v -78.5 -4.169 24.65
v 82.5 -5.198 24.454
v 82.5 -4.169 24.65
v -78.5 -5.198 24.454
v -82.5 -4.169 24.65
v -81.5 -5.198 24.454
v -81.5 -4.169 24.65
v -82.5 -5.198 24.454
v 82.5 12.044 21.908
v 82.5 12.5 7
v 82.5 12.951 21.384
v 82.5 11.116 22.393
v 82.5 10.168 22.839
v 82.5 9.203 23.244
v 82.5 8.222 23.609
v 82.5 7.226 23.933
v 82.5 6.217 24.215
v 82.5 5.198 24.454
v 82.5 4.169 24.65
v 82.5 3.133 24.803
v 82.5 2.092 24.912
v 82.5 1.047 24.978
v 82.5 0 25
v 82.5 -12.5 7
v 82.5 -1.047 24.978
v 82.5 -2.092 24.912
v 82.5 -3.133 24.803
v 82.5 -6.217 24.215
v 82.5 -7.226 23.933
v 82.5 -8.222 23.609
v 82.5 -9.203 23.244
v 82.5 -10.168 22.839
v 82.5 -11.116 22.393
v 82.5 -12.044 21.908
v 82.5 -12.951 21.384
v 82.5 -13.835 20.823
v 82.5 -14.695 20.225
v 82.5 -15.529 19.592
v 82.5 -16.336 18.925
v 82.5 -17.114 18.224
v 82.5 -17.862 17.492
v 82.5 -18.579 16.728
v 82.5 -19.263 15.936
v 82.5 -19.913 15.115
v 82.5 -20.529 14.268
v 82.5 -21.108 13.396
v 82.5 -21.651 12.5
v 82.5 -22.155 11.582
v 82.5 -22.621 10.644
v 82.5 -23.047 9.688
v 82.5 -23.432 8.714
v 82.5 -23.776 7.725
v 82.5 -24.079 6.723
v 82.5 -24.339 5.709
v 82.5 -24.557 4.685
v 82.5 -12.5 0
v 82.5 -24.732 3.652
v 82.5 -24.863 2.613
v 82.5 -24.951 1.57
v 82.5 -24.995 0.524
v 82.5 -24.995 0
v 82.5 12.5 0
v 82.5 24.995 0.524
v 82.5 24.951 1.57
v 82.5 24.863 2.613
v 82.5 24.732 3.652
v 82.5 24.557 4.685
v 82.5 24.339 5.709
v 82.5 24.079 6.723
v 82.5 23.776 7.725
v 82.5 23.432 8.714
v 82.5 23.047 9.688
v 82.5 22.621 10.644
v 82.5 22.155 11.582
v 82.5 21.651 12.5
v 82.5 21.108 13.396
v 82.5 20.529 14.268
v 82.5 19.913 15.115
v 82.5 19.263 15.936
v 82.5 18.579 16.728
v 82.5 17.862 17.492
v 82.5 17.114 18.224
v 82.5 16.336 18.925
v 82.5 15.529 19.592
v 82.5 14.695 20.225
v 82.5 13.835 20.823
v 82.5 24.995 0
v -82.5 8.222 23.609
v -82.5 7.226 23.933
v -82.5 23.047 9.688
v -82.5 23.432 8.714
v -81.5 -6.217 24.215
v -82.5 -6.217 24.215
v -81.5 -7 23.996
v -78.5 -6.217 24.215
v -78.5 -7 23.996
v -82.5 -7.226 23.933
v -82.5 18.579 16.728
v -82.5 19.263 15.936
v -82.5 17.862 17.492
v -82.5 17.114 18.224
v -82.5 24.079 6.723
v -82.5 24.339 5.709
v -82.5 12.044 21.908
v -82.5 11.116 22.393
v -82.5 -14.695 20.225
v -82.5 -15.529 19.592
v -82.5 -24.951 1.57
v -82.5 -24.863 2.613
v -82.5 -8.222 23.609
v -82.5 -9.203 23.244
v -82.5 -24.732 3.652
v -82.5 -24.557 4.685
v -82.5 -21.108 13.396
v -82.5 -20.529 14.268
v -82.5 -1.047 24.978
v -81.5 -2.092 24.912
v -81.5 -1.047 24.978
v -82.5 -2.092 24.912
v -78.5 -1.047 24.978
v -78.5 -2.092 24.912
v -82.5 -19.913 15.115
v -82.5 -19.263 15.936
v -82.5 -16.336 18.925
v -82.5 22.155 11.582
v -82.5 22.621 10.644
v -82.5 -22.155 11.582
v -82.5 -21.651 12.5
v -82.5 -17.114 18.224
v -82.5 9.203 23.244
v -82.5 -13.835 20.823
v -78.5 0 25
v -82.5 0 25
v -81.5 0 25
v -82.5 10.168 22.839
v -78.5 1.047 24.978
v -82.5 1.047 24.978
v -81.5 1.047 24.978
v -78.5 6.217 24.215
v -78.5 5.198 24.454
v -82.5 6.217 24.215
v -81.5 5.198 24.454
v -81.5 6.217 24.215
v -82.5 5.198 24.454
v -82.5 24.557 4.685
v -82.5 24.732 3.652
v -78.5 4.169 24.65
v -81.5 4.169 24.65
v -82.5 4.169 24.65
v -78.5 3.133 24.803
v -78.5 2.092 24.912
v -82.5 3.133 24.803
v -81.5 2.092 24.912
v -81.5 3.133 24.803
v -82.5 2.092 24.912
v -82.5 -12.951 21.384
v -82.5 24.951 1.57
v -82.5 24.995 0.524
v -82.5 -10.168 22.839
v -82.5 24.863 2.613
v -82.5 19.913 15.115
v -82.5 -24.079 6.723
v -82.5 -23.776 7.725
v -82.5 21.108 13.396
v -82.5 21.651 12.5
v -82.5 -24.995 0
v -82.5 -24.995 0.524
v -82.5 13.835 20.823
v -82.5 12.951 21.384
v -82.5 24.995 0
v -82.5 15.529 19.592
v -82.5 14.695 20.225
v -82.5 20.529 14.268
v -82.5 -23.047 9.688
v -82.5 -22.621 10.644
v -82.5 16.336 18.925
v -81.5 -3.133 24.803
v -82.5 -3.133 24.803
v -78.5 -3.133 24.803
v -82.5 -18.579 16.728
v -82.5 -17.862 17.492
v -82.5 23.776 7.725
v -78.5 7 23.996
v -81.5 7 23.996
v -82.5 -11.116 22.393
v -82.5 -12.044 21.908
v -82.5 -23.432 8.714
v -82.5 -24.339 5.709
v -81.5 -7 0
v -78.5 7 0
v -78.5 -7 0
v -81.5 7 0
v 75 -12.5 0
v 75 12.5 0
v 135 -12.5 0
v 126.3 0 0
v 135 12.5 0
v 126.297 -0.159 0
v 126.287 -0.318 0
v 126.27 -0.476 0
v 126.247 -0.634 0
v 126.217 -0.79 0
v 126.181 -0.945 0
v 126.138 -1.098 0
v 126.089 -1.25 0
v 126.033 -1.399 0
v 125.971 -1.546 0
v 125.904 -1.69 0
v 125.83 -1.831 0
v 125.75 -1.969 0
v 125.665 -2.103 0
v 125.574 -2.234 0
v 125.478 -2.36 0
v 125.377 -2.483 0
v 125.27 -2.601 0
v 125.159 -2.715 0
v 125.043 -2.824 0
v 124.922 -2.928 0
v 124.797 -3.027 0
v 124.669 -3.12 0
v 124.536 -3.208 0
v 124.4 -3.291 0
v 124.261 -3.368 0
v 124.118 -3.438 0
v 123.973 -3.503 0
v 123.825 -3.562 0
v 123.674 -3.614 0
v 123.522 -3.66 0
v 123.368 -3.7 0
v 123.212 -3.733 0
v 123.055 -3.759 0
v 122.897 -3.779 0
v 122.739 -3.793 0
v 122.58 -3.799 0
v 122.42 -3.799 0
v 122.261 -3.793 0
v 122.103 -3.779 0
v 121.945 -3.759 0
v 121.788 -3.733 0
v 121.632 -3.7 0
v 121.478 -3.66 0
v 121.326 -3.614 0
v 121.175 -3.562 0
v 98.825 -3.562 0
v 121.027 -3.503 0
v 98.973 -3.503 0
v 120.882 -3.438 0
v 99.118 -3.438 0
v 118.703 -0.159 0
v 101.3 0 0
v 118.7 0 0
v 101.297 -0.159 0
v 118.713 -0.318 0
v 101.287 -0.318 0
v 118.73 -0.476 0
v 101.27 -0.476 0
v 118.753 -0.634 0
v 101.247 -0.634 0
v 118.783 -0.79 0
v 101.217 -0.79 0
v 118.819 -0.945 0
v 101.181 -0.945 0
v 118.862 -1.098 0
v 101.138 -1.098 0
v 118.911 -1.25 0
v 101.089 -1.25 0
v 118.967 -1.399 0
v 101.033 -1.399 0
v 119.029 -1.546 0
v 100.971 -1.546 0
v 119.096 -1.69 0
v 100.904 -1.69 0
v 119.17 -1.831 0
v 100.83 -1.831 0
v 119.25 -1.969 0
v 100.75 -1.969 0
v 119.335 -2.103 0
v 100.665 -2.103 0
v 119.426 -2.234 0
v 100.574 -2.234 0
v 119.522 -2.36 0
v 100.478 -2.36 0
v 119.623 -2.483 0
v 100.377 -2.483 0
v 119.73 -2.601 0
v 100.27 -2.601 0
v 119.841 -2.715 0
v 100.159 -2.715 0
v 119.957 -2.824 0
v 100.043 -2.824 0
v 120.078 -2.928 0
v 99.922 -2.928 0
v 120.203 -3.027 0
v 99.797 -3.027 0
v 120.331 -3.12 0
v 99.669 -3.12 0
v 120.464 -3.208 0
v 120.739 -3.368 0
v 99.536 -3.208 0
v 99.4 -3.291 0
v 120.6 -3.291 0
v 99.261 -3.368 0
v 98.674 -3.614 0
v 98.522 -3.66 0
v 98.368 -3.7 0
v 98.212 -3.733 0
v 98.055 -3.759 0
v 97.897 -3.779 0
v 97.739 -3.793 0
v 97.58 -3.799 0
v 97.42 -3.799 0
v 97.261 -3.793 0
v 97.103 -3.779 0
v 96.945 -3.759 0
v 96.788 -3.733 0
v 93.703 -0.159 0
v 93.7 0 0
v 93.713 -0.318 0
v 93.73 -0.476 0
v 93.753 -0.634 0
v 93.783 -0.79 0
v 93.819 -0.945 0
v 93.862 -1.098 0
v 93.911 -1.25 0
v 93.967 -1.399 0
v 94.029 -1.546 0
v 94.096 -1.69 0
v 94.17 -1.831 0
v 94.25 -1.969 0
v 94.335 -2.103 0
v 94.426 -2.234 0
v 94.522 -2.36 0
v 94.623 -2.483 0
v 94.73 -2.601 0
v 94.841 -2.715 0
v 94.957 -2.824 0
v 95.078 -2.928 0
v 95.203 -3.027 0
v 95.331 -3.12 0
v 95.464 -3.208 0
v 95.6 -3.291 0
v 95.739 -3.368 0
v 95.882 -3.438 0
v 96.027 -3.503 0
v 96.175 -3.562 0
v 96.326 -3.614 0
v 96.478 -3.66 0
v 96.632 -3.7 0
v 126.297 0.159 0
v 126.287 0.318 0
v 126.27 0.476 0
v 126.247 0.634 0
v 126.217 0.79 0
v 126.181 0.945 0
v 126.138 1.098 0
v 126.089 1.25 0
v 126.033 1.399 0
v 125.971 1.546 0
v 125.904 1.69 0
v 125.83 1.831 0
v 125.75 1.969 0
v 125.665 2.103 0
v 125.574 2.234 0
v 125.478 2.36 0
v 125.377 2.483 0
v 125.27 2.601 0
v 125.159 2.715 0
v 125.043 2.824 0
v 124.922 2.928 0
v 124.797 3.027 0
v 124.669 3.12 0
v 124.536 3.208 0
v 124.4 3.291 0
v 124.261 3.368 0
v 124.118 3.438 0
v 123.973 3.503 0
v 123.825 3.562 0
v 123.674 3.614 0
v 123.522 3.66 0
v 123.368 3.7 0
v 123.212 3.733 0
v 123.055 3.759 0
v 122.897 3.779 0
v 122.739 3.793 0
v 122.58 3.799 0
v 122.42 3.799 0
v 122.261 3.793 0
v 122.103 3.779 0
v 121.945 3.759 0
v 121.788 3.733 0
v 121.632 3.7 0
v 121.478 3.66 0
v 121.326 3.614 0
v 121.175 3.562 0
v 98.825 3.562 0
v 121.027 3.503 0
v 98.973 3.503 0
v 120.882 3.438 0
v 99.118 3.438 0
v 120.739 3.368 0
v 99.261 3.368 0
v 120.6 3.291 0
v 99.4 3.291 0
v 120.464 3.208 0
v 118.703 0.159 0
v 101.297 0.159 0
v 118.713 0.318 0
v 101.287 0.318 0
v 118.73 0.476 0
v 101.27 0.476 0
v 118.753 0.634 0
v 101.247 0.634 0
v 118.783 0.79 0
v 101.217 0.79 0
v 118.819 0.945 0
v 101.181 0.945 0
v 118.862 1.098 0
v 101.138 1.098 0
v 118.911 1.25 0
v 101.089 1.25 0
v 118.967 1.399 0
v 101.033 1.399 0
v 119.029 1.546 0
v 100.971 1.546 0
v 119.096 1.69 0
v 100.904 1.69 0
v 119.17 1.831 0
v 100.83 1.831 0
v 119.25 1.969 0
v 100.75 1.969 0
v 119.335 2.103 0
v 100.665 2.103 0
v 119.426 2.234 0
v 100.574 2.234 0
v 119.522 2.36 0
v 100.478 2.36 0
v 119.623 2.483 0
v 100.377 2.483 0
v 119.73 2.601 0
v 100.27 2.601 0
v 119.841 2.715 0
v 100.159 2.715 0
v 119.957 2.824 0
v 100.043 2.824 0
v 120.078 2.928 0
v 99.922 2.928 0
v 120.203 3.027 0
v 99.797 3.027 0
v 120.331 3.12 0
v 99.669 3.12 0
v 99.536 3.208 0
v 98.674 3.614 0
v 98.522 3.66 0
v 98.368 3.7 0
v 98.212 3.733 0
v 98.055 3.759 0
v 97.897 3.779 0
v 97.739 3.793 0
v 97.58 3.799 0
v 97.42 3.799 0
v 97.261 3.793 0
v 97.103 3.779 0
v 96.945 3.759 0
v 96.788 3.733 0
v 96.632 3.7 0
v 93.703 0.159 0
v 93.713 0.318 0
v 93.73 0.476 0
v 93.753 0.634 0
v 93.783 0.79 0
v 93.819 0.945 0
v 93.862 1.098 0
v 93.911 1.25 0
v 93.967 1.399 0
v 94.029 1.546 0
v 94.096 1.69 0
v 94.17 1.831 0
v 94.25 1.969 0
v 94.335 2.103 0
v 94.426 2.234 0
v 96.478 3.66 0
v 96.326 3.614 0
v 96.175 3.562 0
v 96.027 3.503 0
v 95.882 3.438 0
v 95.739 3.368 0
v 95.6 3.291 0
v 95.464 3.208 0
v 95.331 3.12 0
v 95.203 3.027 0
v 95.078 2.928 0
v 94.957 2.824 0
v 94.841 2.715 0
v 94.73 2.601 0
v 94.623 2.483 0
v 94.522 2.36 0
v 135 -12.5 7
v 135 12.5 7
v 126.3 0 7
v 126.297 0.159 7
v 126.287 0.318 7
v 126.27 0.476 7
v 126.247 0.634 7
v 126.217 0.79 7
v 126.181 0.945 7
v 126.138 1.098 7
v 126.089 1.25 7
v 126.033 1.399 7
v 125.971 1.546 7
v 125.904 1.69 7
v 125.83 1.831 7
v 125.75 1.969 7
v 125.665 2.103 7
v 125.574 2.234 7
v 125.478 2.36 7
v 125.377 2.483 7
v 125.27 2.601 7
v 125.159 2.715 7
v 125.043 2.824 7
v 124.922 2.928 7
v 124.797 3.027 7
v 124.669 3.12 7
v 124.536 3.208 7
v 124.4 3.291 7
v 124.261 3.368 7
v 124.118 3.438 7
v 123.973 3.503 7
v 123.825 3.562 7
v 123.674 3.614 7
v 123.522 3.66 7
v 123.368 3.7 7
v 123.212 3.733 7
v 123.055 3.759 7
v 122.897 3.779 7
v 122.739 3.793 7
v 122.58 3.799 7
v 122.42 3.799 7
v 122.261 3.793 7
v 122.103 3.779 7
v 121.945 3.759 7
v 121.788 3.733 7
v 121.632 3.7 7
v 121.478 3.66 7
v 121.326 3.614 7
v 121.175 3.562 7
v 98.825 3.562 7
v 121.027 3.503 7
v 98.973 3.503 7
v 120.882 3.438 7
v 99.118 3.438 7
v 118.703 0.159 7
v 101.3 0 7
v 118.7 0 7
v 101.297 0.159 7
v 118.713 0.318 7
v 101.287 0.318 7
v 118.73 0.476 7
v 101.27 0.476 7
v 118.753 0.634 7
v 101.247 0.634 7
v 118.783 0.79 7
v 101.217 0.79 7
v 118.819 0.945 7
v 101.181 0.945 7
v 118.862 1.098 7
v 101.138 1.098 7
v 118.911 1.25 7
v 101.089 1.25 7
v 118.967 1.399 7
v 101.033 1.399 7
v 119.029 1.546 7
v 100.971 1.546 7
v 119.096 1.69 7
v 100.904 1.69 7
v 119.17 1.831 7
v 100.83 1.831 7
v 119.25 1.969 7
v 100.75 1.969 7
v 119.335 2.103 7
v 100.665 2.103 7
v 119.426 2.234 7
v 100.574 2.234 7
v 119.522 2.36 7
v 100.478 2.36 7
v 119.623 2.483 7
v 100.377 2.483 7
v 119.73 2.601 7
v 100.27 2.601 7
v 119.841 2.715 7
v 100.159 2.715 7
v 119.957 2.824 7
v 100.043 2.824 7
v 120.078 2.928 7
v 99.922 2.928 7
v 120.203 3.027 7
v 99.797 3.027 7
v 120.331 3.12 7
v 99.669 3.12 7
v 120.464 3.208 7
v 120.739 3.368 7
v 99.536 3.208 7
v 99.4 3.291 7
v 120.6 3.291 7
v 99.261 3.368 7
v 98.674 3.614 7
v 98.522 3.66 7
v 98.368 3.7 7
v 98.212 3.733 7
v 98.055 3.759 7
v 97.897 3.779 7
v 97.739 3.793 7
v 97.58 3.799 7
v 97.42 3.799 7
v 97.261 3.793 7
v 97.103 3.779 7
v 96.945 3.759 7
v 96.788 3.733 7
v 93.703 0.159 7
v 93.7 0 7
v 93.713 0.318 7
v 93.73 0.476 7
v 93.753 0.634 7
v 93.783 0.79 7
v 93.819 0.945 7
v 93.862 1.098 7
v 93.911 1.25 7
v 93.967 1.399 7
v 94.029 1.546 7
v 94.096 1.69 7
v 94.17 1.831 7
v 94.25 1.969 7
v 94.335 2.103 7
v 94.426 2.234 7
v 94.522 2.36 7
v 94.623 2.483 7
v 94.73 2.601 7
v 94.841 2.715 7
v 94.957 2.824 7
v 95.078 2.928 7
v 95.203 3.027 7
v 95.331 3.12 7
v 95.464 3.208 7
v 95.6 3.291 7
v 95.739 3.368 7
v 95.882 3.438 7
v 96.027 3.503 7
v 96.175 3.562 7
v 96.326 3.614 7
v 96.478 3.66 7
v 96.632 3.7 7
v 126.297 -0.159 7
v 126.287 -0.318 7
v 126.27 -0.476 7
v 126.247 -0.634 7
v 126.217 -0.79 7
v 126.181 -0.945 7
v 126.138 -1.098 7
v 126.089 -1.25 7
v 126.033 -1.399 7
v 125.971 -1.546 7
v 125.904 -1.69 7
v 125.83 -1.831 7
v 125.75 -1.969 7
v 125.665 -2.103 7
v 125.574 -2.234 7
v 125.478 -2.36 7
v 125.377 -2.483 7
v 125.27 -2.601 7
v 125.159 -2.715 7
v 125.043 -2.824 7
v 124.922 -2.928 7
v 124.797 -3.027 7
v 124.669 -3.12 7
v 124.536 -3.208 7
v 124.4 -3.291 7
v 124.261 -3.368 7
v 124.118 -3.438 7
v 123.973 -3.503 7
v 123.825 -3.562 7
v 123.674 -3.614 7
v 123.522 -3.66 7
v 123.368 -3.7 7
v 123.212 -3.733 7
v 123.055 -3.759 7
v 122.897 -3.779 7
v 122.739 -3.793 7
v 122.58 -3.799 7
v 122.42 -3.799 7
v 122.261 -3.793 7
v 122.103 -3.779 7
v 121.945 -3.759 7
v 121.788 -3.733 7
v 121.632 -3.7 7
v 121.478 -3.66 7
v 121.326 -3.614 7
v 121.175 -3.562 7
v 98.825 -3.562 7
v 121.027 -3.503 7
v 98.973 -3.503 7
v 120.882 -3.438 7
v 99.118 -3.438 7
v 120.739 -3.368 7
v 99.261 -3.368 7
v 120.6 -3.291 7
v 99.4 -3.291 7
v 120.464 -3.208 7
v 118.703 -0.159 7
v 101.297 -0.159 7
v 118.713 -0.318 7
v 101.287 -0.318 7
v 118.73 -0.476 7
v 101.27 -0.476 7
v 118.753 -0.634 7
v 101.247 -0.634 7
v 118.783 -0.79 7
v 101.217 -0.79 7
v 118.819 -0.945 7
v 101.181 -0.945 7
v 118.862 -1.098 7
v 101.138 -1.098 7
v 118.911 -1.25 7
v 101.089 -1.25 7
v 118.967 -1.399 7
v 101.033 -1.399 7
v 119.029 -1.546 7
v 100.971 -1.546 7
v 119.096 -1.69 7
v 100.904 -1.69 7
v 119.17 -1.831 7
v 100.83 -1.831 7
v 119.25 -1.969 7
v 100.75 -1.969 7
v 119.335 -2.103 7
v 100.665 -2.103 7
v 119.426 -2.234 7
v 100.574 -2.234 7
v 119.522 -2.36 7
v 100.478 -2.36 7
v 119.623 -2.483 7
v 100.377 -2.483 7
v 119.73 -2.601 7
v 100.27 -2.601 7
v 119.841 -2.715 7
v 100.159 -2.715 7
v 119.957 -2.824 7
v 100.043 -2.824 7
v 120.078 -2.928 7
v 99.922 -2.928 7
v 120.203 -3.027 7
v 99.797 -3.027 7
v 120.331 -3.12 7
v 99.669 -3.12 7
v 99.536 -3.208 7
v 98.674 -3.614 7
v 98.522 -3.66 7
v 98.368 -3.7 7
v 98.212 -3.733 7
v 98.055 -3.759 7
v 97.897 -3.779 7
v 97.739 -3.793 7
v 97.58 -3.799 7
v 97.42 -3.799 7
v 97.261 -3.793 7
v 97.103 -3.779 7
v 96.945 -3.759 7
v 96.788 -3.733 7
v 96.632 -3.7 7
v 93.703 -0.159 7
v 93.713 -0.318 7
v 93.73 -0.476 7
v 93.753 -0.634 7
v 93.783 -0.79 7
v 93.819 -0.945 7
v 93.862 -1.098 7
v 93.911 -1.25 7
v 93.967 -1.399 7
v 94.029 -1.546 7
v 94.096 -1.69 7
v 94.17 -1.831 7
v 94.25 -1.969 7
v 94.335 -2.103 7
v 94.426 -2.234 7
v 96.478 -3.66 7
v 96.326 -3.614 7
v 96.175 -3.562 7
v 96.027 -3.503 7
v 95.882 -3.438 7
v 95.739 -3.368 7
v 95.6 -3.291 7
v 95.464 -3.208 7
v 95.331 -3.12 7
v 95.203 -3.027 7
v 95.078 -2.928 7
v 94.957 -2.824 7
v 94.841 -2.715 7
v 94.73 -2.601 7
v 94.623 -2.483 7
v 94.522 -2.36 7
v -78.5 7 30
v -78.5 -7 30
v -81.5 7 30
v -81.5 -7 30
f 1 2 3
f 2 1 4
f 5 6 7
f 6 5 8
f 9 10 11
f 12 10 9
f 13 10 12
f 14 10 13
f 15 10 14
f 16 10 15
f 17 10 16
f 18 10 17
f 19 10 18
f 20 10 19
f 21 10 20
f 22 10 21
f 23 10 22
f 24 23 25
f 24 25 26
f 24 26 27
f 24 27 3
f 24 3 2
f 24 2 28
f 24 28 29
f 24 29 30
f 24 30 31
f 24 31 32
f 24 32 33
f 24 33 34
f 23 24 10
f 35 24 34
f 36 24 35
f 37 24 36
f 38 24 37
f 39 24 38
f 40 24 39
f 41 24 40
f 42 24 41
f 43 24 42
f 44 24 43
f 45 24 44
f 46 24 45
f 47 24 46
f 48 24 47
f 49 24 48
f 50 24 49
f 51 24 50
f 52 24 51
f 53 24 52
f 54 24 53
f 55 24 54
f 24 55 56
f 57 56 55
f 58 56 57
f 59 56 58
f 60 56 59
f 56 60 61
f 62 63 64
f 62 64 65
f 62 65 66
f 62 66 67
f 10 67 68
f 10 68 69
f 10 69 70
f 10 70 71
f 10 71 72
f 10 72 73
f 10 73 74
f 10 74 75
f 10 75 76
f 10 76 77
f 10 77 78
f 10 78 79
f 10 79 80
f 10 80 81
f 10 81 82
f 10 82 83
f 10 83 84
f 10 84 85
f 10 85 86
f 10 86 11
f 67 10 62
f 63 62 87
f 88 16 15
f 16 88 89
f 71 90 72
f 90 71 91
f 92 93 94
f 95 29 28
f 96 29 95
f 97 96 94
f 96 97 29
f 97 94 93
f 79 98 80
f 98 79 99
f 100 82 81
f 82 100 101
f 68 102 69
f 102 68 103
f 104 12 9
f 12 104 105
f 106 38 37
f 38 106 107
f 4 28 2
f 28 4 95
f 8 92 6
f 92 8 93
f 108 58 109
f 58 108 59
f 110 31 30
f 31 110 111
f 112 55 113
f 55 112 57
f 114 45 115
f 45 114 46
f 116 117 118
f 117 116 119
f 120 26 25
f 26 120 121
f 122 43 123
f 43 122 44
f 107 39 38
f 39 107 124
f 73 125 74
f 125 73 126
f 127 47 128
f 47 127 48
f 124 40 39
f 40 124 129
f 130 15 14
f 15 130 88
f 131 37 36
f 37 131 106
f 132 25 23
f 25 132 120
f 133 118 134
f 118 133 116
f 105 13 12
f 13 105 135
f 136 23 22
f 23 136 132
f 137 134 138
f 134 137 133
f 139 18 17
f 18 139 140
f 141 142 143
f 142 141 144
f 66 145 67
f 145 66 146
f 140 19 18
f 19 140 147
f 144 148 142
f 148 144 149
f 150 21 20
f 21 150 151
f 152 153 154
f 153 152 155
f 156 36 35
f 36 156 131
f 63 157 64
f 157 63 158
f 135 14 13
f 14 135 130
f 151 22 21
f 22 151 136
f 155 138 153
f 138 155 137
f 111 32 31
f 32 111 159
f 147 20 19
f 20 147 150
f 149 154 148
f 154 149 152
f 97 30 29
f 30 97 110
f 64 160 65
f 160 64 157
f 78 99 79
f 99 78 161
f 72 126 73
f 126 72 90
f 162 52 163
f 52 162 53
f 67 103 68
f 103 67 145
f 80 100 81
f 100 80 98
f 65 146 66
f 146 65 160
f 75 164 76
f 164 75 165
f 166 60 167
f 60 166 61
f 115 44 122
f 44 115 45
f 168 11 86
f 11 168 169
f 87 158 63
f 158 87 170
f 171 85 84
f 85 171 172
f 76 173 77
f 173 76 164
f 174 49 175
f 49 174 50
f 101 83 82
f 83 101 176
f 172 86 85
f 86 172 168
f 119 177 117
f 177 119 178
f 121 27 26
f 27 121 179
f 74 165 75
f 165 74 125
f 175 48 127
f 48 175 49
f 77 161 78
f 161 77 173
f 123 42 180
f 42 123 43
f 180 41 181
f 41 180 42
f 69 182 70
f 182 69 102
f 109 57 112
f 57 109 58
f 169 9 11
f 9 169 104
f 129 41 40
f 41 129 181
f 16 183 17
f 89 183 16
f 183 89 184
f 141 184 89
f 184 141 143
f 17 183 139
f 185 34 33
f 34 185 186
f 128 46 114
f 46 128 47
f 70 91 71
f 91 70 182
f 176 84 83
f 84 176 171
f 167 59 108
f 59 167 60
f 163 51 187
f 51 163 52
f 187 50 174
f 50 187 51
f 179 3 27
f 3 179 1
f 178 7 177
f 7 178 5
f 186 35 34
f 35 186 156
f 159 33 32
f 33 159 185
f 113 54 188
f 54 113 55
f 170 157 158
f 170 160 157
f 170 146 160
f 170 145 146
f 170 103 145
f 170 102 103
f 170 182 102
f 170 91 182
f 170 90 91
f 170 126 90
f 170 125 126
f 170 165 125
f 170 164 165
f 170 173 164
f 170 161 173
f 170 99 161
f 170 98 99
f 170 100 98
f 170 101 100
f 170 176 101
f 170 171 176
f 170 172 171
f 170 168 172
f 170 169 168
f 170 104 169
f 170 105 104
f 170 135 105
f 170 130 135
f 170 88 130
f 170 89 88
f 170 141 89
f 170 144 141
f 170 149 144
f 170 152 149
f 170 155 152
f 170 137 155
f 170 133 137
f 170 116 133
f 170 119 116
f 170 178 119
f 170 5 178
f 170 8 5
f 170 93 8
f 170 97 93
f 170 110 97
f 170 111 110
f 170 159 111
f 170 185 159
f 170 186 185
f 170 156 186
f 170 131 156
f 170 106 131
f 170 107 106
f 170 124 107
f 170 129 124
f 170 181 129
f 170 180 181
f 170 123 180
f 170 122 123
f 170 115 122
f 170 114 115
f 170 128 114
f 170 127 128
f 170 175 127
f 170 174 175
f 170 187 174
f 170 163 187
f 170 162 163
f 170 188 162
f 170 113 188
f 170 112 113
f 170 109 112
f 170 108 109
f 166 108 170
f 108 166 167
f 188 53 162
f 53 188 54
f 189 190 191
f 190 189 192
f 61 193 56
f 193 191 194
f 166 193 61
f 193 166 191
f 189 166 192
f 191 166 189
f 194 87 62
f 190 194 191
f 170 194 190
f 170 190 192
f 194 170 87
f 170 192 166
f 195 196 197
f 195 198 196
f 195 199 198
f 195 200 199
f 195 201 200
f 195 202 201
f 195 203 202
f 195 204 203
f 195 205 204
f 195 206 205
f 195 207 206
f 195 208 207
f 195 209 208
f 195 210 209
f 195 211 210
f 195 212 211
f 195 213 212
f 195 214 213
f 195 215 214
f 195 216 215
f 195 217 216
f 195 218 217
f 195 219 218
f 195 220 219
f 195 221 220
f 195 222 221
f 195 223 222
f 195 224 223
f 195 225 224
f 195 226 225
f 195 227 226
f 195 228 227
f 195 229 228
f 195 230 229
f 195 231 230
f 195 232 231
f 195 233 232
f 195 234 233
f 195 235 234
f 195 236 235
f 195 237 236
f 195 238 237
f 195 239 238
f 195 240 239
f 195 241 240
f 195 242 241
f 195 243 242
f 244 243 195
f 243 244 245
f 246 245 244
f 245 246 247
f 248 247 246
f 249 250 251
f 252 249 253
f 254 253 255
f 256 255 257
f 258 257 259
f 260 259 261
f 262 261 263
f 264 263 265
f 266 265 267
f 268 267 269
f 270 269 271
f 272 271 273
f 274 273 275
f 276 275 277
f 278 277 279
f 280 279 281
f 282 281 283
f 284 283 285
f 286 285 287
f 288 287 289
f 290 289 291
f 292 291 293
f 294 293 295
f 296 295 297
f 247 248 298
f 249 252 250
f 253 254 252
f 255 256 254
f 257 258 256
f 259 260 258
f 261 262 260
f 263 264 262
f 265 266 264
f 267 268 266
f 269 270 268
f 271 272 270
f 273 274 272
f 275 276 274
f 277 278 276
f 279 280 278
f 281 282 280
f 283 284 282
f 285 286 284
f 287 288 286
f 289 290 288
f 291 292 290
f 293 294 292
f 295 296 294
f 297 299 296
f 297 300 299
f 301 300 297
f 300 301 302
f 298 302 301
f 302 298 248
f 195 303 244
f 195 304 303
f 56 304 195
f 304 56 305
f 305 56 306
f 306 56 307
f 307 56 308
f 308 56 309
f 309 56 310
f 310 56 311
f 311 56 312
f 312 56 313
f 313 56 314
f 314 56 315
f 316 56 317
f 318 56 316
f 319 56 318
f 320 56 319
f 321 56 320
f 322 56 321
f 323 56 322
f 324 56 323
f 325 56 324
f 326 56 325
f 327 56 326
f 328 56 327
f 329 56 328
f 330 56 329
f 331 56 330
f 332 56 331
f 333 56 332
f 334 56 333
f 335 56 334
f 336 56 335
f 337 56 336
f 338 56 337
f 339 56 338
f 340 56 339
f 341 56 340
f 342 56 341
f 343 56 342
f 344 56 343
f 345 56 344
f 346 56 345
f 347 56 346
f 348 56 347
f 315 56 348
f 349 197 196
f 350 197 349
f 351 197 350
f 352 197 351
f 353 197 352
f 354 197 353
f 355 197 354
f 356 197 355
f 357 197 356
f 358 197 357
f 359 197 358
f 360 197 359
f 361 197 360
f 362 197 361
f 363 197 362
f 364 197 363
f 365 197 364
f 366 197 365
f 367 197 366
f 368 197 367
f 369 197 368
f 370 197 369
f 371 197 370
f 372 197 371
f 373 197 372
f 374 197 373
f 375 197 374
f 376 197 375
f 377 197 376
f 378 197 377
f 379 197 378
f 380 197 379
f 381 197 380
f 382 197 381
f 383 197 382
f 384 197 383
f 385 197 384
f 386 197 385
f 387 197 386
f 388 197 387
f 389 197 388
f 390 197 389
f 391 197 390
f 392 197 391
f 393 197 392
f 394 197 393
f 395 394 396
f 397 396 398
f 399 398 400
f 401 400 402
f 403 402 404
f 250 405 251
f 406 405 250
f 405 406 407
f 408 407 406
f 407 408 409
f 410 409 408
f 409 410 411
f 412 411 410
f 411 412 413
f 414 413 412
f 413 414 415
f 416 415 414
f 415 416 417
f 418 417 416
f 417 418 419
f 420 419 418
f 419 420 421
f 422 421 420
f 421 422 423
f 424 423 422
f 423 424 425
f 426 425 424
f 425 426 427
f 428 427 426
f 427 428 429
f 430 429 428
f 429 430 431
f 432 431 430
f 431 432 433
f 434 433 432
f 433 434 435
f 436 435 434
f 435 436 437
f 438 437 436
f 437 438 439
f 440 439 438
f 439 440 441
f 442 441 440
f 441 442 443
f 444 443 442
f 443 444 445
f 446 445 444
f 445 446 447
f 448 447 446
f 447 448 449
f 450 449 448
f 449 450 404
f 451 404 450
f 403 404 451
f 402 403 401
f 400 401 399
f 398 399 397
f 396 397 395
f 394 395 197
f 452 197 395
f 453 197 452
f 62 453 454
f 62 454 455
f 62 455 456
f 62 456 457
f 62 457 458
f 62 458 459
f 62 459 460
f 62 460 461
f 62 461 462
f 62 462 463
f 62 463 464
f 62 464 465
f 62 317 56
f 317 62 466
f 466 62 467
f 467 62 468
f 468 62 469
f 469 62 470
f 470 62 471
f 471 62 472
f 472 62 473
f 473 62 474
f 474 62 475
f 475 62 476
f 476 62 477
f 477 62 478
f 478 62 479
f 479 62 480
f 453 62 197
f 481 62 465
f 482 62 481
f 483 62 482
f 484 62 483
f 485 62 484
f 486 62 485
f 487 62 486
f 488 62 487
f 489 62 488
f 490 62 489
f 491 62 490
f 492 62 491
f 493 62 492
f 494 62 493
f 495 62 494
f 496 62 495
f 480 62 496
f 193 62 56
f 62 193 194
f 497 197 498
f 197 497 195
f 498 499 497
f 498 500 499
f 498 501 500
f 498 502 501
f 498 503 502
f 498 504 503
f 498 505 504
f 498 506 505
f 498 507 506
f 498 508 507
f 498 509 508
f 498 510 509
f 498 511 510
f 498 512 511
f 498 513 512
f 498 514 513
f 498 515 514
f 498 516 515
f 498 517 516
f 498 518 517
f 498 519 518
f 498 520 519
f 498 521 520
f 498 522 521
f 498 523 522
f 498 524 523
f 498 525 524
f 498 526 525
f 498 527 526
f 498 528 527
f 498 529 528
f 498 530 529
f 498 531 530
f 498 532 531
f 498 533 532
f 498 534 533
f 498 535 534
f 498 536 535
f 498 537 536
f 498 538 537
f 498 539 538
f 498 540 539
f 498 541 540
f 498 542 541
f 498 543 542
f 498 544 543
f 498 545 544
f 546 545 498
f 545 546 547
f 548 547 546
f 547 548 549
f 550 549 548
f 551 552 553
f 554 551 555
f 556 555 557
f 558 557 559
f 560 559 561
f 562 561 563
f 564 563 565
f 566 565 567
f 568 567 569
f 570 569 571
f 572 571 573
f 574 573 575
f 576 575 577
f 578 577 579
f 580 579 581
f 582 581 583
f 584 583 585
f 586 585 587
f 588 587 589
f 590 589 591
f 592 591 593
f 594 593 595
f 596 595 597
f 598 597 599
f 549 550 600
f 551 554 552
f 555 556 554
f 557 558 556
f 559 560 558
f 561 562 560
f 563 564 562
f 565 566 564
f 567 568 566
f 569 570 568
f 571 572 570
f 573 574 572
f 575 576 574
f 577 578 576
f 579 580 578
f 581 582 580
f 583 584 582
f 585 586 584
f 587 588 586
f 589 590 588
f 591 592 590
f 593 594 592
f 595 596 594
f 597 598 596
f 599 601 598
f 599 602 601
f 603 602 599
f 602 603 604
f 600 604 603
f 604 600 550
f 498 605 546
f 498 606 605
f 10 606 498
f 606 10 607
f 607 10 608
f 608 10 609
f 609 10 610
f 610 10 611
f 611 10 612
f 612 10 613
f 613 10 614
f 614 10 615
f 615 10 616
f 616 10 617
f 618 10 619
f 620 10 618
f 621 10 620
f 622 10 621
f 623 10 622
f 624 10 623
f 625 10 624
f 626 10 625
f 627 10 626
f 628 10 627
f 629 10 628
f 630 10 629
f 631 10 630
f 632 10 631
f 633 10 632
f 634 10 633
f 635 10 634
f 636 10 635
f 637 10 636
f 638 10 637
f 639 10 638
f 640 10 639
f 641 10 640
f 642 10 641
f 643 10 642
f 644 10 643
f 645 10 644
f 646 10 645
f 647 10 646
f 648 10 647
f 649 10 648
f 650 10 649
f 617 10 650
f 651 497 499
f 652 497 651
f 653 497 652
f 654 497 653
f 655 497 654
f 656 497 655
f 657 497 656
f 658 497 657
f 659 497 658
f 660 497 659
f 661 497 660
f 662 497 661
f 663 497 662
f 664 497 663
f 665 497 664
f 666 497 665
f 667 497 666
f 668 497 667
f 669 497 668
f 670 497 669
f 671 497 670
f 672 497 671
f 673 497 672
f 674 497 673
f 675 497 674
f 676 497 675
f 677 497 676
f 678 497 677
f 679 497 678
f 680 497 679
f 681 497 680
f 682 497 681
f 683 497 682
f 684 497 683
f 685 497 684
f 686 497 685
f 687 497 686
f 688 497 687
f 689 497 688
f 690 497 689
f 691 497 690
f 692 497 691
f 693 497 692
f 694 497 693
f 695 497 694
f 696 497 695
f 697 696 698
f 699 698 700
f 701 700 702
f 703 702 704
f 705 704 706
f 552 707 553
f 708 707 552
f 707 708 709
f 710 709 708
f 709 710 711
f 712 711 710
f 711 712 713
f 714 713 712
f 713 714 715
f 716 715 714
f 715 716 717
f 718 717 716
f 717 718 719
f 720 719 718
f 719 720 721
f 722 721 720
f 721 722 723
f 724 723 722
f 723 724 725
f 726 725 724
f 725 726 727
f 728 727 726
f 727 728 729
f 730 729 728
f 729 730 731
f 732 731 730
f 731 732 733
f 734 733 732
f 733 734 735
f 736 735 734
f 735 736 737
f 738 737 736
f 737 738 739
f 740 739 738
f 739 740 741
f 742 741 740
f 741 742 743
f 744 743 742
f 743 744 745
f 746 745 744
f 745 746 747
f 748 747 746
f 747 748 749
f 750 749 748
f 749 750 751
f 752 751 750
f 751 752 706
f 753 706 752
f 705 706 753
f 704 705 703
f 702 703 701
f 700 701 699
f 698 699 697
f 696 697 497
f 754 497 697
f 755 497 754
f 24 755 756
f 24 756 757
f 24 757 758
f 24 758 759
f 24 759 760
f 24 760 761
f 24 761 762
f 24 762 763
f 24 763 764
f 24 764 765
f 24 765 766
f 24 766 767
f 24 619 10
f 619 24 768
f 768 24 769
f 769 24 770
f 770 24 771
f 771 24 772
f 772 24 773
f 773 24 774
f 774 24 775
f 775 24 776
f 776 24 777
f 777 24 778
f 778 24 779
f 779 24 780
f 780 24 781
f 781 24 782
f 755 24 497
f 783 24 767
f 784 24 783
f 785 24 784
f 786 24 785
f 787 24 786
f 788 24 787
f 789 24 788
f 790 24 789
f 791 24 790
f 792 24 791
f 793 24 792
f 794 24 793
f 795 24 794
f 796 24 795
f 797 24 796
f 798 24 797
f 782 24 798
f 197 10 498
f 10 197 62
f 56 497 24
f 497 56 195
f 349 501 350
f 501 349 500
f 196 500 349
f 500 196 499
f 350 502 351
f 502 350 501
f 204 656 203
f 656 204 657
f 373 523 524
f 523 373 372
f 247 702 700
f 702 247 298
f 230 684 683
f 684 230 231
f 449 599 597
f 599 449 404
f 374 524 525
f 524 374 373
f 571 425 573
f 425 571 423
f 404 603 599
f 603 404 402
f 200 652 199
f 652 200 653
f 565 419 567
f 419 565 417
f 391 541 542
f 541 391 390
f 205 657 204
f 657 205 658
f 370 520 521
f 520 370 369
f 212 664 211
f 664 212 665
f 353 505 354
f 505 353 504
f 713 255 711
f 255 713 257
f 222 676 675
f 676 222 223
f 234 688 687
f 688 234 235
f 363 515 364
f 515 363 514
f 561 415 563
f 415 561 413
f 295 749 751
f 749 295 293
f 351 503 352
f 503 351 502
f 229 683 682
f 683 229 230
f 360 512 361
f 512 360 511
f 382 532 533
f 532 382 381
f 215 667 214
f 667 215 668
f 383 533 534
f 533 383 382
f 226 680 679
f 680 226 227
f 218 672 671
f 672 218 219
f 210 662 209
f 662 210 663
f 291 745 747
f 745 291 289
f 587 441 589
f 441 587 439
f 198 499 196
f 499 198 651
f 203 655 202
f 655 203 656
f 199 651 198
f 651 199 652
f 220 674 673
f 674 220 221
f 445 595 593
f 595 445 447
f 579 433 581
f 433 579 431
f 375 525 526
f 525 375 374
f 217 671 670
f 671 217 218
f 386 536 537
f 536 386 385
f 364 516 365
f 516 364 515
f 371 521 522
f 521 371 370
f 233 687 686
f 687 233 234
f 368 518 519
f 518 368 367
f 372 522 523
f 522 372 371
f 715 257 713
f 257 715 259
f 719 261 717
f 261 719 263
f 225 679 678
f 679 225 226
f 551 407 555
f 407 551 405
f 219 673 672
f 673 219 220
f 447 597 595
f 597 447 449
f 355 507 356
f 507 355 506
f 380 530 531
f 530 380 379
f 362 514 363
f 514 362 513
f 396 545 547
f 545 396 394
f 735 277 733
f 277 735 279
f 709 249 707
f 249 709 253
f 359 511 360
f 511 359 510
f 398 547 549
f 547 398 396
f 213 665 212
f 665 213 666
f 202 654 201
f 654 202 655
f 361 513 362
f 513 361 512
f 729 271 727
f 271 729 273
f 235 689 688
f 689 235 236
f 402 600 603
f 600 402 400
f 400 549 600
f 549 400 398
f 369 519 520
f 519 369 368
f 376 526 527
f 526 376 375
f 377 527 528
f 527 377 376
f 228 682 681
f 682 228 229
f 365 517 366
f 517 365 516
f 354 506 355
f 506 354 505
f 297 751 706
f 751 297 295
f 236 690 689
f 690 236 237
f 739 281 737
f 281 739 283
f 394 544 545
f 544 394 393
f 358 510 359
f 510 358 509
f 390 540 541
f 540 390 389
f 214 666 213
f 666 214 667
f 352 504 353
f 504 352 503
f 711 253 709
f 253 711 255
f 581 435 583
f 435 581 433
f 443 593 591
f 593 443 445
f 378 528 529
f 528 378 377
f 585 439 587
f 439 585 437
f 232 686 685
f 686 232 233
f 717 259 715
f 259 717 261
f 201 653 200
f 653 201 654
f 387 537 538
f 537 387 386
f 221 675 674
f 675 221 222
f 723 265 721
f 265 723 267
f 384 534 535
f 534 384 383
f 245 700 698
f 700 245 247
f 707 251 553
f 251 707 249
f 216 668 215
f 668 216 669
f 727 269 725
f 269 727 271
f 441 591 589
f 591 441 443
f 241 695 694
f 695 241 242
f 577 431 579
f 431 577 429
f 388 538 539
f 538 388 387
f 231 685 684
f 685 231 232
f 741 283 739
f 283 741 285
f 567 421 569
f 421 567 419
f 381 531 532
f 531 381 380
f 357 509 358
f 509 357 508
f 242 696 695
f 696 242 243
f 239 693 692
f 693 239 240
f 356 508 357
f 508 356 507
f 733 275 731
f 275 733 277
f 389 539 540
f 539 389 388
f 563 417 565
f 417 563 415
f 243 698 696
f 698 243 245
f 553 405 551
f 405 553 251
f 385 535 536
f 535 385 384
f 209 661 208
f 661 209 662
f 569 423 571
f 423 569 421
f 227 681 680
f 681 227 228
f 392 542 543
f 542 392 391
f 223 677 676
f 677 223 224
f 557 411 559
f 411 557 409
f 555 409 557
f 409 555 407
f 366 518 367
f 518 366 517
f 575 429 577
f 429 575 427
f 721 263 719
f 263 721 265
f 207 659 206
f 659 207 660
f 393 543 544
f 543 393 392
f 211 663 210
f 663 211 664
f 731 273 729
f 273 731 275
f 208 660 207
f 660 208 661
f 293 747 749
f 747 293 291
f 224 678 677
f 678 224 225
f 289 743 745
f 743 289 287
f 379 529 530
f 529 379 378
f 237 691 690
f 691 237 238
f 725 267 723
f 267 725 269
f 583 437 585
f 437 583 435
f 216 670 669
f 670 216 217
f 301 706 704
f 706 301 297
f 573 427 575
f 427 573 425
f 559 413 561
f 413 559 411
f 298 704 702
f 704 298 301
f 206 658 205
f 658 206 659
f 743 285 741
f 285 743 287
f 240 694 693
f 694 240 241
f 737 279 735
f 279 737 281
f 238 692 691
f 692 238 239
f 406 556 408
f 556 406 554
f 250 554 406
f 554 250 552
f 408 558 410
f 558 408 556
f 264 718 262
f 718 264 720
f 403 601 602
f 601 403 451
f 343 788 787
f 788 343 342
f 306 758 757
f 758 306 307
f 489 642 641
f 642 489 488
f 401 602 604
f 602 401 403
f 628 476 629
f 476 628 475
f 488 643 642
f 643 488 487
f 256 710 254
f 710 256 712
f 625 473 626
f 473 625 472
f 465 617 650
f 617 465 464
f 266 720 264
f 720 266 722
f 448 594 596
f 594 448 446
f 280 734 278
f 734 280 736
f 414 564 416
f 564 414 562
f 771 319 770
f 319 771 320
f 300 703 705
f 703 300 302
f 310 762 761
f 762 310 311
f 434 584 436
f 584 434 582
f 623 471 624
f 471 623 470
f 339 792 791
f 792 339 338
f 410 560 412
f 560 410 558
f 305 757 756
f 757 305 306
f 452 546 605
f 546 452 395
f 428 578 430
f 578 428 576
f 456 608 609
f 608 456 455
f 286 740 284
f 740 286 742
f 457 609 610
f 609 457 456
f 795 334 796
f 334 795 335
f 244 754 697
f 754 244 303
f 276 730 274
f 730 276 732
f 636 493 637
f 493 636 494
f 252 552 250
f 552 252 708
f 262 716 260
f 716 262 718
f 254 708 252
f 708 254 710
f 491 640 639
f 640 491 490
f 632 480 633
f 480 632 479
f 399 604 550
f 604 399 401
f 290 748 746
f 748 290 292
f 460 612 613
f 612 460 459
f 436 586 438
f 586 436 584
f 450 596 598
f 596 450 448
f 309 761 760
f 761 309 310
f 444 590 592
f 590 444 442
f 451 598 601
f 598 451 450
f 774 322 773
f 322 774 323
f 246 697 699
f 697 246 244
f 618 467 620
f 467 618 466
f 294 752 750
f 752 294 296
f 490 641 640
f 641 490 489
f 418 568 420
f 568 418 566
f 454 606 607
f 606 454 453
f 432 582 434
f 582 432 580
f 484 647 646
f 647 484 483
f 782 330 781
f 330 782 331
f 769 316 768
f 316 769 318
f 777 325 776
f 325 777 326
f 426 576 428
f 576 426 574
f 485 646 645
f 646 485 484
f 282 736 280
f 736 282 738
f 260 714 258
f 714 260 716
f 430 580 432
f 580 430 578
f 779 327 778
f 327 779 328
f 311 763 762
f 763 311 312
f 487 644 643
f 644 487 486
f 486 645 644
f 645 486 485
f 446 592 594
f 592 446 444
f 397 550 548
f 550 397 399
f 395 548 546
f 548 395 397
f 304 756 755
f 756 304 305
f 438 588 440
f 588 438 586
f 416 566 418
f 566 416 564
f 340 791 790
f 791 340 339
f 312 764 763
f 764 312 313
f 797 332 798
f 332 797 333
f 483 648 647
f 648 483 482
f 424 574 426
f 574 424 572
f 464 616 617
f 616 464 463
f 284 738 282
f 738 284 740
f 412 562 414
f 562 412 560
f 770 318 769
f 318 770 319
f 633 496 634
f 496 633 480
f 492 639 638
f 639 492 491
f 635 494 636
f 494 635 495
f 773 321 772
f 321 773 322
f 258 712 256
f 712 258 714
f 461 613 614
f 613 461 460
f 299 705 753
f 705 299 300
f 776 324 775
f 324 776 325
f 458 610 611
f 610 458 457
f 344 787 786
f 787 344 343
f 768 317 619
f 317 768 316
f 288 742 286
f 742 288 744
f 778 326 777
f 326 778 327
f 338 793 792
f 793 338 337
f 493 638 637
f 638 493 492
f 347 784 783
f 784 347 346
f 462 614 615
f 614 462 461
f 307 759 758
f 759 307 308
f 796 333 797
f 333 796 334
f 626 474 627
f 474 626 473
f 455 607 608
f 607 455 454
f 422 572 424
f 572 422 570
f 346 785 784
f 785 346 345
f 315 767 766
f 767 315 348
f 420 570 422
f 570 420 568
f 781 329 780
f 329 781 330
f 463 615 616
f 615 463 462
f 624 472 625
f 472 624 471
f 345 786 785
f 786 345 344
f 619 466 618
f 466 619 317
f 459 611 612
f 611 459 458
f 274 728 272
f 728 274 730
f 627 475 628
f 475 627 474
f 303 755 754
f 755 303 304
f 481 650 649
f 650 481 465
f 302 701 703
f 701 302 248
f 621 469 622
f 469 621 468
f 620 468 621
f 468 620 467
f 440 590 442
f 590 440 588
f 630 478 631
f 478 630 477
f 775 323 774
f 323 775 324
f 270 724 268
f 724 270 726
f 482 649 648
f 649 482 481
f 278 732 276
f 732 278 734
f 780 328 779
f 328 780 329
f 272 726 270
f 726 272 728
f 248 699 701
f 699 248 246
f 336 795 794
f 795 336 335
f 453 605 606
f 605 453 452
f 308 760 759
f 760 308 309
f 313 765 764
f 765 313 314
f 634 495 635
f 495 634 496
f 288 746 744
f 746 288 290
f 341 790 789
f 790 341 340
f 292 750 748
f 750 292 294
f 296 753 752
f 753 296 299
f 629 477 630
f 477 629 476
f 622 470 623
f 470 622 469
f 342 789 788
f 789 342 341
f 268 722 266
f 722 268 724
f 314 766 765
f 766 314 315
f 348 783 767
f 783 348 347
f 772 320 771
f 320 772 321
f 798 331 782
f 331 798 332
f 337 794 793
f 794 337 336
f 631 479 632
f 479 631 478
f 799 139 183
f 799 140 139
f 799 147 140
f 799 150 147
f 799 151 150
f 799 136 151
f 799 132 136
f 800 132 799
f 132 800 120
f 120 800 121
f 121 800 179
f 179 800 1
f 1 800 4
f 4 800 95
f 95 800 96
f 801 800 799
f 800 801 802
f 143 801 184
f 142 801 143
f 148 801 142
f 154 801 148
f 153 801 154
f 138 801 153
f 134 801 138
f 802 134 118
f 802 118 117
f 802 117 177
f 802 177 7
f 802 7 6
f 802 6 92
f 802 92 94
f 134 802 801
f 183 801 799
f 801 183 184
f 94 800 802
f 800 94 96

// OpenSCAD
// Ankur Gupta
// Glabs
// github.com/agupta231
// ankur.gupta-web.com

$fn  = 150;

radius = 25;
width =  165;
screwThickness = 7;
screwPlateLength = 55;
screwPlateWidth = 25;
screwHoleRadius = 3.8;
screwHoleBuffer = 15;
stopperWidth = 14;
stopperLength = 5;
stopperThickness = 3;

union() {
    difference() {
        rotate([0, 90, 0]) {
           cylinder(width, radius, radius, center = true);
        }
        translate([0, 0, -radius / 2]) {
            cube([width + 5, radius * 2, radius], center = true);
        }
    }

    difference() {
        translate([width / 2 + screwPlateLength / 2 - 5, 0, screwThickness / 2]) {
            cube([screwPlateLength + 5, screwPlateWidth, screwThickness], center = true);
        }
        translate([width / 2 + screwPlateLength - screwHoleBuffer,0,screwThickness / 2]) {
            cylinder(screwThickness + 5, screwHoleRadius, screwHoleRadius, center = true);
        }
        translate([width / 2 + screwHoleBuffer,0,screwThickness / 2]) {
            cylinder(screwThickness + 5, screwHoleRadius, screwHoleRadius, center = true);
        }
    }
    
    translate([-width / 2 + stopperThickness / 2 + 1, 0, (stopperLength + radius) / 2]) {
        cube([stopperThickness, stopperWidth, stopperLength + radius], center = true);
    }
}
